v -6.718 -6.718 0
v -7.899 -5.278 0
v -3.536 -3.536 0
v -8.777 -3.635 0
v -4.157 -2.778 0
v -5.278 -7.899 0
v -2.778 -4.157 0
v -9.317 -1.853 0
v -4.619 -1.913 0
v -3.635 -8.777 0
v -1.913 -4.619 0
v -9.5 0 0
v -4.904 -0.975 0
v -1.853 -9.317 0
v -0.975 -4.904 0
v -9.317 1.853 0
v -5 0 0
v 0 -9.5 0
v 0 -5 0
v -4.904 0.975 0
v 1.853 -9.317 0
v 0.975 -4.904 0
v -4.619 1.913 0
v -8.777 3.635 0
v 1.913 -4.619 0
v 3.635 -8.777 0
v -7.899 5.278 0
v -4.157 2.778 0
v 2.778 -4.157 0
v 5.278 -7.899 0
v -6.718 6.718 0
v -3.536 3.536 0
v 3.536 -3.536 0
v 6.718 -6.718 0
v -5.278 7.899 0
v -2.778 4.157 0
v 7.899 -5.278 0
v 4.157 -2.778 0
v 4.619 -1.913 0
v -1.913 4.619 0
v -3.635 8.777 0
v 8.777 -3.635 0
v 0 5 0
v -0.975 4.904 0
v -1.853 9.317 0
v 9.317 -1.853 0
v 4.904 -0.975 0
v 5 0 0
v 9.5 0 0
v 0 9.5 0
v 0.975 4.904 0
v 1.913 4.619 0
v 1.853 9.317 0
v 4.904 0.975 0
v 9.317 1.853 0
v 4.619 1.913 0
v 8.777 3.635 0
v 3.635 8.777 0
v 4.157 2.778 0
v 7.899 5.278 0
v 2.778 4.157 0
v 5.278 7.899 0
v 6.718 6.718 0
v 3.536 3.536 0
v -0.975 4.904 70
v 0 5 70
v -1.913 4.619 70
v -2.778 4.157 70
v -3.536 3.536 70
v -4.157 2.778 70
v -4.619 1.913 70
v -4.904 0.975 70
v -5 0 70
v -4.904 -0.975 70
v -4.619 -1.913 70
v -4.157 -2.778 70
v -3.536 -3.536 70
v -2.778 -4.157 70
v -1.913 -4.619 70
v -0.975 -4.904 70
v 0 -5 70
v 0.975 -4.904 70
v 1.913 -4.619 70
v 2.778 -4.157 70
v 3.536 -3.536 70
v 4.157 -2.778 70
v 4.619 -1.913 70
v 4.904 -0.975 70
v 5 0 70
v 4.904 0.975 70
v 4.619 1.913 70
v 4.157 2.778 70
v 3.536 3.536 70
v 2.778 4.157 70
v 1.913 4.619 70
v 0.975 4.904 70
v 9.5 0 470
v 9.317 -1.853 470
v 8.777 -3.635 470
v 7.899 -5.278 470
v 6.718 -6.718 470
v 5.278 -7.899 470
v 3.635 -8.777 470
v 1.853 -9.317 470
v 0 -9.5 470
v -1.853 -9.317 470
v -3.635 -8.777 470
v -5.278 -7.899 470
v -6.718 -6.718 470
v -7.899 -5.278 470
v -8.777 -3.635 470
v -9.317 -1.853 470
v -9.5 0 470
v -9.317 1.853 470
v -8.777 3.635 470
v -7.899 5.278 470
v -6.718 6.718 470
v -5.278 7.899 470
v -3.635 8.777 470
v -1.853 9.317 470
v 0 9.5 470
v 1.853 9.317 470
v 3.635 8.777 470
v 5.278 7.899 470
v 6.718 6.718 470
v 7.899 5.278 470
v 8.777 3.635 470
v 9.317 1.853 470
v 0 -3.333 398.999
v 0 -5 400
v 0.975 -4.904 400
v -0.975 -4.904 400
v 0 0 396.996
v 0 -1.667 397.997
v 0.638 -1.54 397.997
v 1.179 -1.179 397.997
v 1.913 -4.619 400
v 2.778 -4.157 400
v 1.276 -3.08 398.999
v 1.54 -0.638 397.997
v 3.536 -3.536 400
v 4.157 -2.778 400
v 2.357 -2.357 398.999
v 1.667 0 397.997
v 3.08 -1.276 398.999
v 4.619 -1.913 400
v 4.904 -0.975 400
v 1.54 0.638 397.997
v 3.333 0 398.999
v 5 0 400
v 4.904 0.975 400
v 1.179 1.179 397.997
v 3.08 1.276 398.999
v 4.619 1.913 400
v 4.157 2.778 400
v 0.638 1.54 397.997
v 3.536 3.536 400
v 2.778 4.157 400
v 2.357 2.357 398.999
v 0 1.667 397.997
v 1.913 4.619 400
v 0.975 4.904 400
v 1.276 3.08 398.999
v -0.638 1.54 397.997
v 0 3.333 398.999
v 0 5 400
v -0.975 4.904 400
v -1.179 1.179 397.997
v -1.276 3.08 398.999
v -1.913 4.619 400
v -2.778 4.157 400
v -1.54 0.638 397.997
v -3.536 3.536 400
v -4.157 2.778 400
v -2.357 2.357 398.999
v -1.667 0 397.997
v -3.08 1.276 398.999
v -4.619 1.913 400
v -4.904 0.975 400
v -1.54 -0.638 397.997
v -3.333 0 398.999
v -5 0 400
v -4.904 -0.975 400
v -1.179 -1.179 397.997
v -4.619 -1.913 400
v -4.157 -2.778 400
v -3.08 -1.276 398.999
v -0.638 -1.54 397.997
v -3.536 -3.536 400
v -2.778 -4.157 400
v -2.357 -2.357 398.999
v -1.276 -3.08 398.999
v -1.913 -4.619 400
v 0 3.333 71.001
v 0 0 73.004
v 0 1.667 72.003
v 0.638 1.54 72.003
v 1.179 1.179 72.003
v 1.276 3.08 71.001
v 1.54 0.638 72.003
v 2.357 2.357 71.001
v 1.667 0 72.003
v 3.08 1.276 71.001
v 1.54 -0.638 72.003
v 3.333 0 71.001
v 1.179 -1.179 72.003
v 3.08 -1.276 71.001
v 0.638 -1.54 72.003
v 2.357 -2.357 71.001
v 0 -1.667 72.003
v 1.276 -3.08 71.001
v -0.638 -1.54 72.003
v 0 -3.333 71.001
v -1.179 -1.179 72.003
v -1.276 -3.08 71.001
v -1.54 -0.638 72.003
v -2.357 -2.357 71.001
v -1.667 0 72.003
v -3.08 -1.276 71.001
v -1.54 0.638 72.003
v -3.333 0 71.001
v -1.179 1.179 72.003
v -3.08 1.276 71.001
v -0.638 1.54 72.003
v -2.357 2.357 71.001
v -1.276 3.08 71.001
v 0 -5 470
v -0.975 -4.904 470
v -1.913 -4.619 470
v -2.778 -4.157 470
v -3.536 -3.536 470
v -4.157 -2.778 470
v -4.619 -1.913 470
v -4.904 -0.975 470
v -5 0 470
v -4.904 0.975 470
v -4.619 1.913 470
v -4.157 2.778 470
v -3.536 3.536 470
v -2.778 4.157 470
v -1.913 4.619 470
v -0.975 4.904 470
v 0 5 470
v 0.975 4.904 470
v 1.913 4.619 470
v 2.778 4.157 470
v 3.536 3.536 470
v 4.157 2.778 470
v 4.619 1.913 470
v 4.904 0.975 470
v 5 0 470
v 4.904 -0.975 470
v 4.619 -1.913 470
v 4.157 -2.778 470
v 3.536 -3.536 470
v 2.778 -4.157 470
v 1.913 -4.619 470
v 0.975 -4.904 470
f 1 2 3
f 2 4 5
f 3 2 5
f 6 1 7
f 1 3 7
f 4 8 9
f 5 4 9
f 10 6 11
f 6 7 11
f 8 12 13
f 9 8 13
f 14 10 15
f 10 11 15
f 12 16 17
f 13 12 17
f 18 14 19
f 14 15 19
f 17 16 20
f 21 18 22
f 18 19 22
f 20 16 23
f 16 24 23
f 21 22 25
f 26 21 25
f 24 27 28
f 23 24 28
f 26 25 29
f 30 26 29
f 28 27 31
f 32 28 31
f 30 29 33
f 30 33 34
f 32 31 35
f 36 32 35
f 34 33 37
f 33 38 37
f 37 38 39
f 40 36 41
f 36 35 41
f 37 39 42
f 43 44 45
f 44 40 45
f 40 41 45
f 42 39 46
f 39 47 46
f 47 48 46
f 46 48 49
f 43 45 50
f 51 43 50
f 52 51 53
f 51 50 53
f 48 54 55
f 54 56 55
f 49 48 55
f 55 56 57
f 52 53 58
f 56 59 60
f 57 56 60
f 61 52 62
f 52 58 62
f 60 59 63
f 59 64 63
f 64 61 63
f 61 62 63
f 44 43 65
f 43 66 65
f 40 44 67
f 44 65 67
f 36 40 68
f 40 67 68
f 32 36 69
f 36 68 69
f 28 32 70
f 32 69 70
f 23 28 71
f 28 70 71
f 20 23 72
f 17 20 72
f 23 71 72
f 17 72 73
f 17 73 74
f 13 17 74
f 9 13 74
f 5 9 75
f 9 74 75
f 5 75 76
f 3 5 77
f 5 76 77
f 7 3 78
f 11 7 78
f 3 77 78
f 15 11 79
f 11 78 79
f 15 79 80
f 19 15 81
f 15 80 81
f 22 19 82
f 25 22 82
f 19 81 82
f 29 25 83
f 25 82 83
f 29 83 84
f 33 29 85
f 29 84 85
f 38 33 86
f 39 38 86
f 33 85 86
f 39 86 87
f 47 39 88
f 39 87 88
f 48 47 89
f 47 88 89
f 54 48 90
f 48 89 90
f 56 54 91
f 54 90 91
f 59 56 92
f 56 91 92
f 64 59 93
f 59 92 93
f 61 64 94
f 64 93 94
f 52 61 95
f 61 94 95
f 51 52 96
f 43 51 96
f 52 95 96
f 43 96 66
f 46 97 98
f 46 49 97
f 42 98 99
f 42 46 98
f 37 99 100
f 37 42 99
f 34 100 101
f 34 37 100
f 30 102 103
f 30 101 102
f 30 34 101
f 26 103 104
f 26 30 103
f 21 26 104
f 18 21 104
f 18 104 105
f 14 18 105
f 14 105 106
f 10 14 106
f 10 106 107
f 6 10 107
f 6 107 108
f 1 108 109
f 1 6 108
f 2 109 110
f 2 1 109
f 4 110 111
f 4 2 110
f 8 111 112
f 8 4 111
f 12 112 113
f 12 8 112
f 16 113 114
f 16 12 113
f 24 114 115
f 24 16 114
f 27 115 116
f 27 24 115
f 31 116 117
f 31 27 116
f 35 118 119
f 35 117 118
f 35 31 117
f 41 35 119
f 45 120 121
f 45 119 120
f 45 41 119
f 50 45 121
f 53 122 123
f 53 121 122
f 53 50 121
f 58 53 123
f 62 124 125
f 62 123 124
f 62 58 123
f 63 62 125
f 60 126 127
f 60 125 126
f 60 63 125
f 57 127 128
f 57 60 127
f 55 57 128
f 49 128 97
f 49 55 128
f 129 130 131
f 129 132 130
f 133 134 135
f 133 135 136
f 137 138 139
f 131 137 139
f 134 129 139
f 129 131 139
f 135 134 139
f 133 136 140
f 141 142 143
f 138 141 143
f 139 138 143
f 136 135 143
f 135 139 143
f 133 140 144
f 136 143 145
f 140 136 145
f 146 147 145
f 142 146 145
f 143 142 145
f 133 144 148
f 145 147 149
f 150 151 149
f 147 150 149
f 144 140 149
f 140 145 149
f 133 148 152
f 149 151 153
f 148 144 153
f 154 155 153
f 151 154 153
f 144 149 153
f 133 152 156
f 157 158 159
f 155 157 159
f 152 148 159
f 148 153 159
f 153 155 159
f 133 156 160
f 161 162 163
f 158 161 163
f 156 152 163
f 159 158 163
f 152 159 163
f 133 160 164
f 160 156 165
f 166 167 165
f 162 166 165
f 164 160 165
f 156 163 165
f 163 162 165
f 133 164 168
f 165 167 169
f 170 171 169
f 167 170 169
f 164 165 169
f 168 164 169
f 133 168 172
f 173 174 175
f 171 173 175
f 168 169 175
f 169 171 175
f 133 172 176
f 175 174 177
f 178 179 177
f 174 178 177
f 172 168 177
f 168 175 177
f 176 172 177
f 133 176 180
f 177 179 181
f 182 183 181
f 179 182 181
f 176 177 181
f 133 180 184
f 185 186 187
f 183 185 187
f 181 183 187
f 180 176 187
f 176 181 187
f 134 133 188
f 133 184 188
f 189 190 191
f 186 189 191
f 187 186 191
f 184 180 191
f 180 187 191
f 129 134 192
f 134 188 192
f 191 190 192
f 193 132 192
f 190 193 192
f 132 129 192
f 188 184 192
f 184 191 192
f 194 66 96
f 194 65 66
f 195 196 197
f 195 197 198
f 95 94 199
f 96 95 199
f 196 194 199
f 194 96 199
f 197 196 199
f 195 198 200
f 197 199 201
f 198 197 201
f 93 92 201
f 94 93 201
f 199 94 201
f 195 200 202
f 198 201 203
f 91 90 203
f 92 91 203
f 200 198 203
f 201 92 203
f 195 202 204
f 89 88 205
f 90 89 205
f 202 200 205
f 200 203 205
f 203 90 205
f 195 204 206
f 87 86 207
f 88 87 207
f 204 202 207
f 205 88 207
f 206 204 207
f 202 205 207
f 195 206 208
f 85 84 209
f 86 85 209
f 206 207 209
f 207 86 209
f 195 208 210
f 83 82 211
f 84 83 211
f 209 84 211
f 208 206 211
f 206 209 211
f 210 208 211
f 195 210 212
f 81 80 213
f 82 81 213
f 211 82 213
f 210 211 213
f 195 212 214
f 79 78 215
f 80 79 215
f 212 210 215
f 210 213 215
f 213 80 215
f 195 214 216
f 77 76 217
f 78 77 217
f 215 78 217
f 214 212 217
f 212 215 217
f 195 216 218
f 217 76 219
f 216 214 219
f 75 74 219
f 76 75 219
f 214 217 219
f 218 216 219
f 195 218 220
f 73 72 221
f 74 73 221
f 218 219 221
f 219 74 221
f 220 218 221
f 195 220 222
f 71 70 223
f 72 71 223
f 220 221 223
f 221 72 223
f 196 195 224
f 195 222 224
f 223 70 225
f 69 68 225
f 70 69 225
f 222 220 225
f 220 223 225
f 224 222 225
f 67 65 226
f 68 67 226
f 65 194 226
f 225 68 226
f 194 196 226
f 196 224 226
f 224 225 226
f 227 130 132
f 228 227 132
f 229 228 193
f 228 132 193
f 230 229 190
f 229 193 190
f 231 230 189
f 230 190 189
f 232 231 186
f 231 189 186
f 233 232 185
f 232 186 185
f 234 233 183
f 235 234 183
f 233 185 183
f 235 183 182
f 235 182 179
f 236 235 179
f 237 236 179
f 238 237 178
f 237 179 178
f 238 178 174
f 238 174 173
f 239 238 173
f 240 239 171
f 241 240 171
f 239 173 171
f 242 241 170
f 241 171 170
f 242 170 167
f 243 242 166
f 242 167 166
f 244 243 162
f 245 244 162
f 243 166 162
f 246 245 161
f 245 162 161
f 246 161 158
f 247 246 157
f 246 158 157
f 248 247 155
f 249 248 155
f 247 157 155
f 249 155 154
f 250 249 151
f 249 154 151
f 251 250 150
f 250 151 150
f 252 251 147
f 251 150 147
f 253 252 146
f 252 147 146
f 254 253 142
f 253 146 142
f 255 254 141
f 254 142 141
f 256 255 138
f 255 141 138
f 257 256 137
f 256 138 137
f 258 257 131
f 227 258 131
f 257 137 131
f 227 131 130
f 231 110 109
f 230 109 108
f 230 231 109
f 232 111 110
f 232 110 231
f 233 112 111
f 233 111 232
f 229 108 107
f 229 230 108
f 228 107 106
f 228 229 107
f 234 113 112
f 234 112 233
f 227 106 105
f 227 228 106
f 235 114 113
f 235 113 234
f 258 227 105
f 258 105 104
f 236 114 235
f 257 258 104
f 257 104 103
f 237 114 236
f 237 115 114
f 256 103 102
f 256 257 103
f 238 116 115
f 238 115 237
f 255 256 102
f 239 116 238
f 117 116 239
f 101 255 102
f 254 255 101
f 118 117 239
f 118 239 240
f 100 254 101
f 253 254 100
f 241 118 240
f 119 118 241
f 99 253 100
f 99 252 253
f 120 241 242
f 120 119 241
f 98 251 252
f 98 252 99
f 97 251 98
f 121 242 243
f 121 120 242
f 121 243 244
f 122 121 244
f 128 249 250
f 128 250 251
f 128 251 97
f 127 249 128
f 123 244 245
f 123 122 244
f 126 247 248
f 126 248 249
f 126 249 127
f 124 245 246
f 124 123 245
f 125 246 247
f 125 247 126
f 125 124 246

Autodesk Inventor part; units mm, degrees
ref_plane "YZ Plane" through (0, 0, 0) normal (1, 0, 0) x (0, 1, 0)
ref_plane "XZ Plane" through (0, 0, 0) normal (0, 1, 0) x (-1, 0, 0)
ref_plane "XY Plane" through (0, 0, 0) normal (0, 0, 1) x (1, 0, 0)
sketch "Sketch1" plane through (0, 0, 0) normal (0, 0, 1) x (1, 0, 0)
  circle A0 centre (0, 0) radius 9.5
  dimension "d0" = 19
extrude "Extrusion1" add sketch "Sketch1" along normal blind 470
hole "Hole1" at (0, 0, 470) direction (0, 0, -1) diameter 10 depth 70 tip angle 118
hole "Hole2" at (0, 0, 0) direction (0, 0, 1) diameter 10 depth 70 tip angle 118
properties part number "Barra-garfo" material "Aluminium AW-7020"
